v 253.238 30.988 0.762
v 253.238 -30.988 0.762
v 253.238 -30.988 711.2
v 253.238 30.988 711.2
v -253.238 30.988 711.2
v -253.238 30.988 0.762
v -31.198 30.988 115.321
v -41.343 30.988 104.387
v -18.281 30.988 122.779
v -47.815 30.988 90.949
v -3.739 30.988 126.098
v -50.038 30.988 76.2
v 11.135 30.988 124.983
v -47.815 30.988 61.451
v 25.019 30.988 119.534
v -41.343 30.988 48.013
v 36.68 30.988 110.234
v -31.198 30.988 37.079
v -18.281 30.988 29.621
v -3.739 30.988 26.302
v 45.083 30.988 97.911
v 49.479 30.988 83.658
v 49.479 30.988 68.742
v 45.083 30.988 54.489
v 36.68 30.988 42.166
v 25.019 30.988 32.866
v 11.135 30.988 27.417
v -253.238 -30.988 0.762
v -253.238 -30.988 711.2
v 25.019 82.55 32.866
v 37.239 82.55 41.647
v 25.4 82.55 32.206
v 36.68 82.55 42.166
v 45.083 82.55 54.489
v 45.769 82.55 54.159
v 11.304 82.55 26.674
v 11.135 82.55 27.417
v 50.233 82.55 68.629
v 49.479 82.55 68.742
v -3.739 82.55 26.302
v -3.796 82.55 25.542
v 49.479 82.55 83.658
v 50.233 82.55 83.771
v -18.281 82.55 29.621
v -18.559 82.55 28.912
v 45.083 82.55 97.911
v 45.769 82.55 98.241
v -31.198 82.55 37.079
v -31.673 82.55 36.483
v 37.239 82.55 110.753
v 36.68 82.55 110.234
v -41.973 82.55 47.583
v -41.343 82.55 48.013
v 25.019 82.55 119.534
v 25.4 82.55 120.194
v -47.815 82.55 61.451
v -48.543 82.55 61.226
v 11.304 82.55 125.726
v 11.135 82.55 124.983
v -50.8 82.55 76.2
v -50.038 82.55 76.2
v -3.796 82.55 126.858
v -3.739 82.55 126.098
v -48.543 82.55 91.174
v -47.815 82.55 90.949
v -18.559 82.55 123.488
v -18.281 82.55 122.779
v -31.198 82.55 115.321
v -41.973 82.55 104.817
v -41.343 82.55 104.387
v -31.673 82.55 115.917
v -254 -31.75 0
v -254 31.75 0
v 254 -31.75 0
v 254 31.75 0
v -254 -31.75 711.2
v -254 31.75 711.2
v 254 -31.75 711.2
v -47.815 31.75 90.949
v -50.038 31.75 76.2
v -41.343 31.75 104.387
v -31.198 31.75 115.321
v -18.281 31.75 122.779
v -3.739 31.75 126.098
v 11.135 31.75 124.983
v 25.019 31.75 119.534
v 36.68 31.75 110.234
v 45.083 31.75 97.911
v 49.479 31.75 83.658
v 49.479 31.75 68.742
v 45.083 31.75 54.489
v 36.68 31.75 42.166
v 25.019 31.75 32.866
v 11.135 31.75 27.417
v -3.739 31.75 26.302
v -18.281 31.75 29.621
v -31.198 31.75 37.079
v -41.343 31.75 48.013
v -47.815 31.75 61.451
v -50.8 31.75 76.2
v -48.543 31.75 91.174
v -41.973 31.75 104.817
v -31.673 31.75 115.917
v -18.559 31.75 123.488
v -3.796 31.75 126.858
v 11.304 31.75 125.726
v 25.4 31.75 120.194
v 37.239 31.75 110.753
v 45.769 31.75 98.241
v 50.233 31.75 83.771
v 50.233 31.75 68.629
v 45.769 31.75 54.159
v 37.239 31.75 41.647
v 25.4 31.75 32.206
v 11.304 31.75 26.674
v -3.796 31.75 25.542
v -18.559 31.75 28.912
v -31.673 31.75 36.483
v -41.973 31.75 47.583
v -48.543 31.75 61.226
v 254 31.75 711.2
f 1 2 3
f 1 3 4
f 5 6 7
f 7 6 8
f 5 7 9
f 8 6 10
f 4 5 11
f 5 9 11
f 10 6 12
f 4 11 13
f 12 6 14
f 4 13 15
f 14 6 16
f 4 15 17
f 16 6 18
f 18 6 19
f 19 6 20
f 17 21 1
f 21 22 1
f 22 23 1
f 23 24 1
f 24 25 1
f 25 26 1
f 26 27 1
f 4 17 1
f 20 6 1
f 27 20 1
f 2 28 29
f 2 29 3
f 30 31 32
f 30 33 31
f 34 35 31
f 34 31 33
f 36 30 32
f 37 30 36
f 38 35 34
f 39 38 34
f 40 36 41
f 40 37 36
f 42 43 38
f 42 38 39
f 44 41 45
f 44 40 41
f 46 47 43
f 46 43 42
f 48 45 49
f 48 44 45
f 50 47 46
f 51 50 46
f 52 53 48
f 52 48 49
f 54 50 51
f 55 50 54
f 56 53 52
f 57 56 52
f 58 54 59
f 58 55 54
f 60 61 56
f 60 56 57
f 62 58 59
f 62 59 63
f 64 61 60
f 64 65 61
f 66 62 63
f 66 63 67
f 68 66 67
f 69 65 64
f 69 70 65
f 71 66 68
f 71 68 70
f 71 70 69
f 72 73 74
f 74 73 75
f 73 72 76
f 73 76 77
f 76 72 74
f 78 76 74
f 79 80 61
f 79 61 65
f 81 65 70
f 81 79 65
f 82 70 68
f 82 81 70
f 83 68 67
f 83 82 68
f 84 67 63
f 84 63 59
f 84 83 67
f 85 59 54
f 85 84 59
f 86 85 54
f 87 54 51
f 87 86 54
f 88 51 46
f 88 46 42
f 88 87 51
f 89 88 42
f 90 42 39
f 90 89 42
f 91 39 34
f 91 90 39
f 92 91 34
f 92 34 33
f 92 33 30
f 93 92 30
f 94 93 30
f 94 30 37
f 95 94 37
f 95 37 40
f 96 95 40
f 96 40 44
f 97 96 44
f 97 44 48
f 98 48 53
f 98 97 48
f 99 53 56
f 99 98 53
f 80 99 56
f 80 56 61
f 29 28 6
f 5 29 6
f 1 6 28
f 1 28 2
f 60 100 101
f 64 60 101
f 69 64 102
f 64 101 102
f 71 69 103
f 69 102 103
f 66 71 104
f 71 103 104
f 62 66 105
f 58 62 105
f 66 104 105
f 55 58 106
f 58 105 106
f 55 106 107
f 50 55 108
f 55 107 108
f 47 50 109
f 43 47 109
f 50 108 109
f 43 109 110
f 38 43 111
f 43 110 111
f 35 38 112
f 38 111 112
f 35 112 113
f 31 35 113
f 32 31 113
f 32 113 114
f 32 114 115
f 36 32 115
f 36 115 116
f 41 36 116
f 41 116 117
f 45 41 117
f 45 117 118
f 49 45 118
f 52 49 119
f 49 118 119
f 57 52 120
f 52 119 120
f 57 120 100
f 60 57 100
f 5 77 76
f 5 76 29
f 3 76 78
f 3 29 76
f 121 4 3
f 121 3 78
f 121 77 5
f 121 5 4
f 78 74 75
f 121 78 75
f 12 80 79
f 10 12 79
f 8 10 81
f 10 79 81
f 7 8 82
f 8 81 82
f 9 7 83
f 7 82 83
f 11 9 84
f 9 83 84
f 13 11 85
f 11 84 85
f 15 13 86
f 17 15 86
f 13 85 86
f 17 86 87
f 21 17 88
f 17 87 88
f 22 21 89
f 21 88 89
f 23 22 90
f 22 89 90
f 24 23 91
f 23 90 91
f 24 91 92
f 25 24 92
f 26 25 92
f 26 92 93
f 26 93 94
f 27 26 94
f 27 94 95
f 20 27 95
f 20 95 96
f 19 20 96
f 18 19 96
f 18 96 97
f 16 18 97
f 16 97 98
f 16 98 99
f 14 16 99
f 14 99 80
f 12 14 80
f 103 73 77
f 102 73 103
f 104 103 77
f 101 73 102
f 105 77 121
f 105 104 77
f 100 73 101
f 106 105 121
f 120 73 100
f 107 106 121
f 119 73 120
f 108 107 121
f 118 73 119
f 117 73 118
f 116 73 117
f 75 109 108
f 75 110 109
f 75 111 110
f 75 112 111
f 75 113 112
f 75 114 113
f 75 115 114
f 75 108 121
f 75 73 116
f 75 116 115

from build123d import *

# Parameters (mm, degrees)
F0_W     = 508
F0_H     = 63.5
F0_W_2   = 506.476
F0_H_2   = 61.976
F1_DEPTH = 711.2
F2_DEPTH = 0.762
F3_R     = 50.8
F3_R_2   = 50.038
F4_DEPTH = 50.8
F5_DEPTH = 25.4


with BuildPart() as f1:
    # F0 (on Top) → F1 (new body)
    with BuildSketch(Plane.XY):
        Rectangle(F0_W, F0_H)
        Rectangle(F0_W_2, F0_H_2, mode=Mode.SUBTRACT)
    extrude(amount=F1_DEPTH)

    # F0 (on Top) → F2 (join)
    with BuildSketch(Plane.XY):
        Rectangle(F0_W_2, F0_H_2)
    extrude(amount=F2_DEPTH)

    # F3 (on face) → F4 (join)
    with BuildSketch(Plane(origin=(0, 31.75, 0), x_dir=(-1, 0, 0), z_dir=(0, 1, 0))):
        with Locations((0, 76.2)):
            Circle(F3_R)
        with Locations((0, 76.2)):
            Circle(F3_R_2, mode=Mode.SUBTRACT)
    extrude(amount=F4_DEPTH)

    # F3 (on face) → F5 (cut)
    with BuildSketch(Plane(origin=(0, 31.75, 0), x_dir=(-1, 0, 0), z_dir=(0, 1, 0))):
        with Locations((0, 76.2)):
            Circle(F3_R_2)
    extrude(amount=-F5_DEPTH, mode=Mode.SUBTRACT)


solid = f1.part
